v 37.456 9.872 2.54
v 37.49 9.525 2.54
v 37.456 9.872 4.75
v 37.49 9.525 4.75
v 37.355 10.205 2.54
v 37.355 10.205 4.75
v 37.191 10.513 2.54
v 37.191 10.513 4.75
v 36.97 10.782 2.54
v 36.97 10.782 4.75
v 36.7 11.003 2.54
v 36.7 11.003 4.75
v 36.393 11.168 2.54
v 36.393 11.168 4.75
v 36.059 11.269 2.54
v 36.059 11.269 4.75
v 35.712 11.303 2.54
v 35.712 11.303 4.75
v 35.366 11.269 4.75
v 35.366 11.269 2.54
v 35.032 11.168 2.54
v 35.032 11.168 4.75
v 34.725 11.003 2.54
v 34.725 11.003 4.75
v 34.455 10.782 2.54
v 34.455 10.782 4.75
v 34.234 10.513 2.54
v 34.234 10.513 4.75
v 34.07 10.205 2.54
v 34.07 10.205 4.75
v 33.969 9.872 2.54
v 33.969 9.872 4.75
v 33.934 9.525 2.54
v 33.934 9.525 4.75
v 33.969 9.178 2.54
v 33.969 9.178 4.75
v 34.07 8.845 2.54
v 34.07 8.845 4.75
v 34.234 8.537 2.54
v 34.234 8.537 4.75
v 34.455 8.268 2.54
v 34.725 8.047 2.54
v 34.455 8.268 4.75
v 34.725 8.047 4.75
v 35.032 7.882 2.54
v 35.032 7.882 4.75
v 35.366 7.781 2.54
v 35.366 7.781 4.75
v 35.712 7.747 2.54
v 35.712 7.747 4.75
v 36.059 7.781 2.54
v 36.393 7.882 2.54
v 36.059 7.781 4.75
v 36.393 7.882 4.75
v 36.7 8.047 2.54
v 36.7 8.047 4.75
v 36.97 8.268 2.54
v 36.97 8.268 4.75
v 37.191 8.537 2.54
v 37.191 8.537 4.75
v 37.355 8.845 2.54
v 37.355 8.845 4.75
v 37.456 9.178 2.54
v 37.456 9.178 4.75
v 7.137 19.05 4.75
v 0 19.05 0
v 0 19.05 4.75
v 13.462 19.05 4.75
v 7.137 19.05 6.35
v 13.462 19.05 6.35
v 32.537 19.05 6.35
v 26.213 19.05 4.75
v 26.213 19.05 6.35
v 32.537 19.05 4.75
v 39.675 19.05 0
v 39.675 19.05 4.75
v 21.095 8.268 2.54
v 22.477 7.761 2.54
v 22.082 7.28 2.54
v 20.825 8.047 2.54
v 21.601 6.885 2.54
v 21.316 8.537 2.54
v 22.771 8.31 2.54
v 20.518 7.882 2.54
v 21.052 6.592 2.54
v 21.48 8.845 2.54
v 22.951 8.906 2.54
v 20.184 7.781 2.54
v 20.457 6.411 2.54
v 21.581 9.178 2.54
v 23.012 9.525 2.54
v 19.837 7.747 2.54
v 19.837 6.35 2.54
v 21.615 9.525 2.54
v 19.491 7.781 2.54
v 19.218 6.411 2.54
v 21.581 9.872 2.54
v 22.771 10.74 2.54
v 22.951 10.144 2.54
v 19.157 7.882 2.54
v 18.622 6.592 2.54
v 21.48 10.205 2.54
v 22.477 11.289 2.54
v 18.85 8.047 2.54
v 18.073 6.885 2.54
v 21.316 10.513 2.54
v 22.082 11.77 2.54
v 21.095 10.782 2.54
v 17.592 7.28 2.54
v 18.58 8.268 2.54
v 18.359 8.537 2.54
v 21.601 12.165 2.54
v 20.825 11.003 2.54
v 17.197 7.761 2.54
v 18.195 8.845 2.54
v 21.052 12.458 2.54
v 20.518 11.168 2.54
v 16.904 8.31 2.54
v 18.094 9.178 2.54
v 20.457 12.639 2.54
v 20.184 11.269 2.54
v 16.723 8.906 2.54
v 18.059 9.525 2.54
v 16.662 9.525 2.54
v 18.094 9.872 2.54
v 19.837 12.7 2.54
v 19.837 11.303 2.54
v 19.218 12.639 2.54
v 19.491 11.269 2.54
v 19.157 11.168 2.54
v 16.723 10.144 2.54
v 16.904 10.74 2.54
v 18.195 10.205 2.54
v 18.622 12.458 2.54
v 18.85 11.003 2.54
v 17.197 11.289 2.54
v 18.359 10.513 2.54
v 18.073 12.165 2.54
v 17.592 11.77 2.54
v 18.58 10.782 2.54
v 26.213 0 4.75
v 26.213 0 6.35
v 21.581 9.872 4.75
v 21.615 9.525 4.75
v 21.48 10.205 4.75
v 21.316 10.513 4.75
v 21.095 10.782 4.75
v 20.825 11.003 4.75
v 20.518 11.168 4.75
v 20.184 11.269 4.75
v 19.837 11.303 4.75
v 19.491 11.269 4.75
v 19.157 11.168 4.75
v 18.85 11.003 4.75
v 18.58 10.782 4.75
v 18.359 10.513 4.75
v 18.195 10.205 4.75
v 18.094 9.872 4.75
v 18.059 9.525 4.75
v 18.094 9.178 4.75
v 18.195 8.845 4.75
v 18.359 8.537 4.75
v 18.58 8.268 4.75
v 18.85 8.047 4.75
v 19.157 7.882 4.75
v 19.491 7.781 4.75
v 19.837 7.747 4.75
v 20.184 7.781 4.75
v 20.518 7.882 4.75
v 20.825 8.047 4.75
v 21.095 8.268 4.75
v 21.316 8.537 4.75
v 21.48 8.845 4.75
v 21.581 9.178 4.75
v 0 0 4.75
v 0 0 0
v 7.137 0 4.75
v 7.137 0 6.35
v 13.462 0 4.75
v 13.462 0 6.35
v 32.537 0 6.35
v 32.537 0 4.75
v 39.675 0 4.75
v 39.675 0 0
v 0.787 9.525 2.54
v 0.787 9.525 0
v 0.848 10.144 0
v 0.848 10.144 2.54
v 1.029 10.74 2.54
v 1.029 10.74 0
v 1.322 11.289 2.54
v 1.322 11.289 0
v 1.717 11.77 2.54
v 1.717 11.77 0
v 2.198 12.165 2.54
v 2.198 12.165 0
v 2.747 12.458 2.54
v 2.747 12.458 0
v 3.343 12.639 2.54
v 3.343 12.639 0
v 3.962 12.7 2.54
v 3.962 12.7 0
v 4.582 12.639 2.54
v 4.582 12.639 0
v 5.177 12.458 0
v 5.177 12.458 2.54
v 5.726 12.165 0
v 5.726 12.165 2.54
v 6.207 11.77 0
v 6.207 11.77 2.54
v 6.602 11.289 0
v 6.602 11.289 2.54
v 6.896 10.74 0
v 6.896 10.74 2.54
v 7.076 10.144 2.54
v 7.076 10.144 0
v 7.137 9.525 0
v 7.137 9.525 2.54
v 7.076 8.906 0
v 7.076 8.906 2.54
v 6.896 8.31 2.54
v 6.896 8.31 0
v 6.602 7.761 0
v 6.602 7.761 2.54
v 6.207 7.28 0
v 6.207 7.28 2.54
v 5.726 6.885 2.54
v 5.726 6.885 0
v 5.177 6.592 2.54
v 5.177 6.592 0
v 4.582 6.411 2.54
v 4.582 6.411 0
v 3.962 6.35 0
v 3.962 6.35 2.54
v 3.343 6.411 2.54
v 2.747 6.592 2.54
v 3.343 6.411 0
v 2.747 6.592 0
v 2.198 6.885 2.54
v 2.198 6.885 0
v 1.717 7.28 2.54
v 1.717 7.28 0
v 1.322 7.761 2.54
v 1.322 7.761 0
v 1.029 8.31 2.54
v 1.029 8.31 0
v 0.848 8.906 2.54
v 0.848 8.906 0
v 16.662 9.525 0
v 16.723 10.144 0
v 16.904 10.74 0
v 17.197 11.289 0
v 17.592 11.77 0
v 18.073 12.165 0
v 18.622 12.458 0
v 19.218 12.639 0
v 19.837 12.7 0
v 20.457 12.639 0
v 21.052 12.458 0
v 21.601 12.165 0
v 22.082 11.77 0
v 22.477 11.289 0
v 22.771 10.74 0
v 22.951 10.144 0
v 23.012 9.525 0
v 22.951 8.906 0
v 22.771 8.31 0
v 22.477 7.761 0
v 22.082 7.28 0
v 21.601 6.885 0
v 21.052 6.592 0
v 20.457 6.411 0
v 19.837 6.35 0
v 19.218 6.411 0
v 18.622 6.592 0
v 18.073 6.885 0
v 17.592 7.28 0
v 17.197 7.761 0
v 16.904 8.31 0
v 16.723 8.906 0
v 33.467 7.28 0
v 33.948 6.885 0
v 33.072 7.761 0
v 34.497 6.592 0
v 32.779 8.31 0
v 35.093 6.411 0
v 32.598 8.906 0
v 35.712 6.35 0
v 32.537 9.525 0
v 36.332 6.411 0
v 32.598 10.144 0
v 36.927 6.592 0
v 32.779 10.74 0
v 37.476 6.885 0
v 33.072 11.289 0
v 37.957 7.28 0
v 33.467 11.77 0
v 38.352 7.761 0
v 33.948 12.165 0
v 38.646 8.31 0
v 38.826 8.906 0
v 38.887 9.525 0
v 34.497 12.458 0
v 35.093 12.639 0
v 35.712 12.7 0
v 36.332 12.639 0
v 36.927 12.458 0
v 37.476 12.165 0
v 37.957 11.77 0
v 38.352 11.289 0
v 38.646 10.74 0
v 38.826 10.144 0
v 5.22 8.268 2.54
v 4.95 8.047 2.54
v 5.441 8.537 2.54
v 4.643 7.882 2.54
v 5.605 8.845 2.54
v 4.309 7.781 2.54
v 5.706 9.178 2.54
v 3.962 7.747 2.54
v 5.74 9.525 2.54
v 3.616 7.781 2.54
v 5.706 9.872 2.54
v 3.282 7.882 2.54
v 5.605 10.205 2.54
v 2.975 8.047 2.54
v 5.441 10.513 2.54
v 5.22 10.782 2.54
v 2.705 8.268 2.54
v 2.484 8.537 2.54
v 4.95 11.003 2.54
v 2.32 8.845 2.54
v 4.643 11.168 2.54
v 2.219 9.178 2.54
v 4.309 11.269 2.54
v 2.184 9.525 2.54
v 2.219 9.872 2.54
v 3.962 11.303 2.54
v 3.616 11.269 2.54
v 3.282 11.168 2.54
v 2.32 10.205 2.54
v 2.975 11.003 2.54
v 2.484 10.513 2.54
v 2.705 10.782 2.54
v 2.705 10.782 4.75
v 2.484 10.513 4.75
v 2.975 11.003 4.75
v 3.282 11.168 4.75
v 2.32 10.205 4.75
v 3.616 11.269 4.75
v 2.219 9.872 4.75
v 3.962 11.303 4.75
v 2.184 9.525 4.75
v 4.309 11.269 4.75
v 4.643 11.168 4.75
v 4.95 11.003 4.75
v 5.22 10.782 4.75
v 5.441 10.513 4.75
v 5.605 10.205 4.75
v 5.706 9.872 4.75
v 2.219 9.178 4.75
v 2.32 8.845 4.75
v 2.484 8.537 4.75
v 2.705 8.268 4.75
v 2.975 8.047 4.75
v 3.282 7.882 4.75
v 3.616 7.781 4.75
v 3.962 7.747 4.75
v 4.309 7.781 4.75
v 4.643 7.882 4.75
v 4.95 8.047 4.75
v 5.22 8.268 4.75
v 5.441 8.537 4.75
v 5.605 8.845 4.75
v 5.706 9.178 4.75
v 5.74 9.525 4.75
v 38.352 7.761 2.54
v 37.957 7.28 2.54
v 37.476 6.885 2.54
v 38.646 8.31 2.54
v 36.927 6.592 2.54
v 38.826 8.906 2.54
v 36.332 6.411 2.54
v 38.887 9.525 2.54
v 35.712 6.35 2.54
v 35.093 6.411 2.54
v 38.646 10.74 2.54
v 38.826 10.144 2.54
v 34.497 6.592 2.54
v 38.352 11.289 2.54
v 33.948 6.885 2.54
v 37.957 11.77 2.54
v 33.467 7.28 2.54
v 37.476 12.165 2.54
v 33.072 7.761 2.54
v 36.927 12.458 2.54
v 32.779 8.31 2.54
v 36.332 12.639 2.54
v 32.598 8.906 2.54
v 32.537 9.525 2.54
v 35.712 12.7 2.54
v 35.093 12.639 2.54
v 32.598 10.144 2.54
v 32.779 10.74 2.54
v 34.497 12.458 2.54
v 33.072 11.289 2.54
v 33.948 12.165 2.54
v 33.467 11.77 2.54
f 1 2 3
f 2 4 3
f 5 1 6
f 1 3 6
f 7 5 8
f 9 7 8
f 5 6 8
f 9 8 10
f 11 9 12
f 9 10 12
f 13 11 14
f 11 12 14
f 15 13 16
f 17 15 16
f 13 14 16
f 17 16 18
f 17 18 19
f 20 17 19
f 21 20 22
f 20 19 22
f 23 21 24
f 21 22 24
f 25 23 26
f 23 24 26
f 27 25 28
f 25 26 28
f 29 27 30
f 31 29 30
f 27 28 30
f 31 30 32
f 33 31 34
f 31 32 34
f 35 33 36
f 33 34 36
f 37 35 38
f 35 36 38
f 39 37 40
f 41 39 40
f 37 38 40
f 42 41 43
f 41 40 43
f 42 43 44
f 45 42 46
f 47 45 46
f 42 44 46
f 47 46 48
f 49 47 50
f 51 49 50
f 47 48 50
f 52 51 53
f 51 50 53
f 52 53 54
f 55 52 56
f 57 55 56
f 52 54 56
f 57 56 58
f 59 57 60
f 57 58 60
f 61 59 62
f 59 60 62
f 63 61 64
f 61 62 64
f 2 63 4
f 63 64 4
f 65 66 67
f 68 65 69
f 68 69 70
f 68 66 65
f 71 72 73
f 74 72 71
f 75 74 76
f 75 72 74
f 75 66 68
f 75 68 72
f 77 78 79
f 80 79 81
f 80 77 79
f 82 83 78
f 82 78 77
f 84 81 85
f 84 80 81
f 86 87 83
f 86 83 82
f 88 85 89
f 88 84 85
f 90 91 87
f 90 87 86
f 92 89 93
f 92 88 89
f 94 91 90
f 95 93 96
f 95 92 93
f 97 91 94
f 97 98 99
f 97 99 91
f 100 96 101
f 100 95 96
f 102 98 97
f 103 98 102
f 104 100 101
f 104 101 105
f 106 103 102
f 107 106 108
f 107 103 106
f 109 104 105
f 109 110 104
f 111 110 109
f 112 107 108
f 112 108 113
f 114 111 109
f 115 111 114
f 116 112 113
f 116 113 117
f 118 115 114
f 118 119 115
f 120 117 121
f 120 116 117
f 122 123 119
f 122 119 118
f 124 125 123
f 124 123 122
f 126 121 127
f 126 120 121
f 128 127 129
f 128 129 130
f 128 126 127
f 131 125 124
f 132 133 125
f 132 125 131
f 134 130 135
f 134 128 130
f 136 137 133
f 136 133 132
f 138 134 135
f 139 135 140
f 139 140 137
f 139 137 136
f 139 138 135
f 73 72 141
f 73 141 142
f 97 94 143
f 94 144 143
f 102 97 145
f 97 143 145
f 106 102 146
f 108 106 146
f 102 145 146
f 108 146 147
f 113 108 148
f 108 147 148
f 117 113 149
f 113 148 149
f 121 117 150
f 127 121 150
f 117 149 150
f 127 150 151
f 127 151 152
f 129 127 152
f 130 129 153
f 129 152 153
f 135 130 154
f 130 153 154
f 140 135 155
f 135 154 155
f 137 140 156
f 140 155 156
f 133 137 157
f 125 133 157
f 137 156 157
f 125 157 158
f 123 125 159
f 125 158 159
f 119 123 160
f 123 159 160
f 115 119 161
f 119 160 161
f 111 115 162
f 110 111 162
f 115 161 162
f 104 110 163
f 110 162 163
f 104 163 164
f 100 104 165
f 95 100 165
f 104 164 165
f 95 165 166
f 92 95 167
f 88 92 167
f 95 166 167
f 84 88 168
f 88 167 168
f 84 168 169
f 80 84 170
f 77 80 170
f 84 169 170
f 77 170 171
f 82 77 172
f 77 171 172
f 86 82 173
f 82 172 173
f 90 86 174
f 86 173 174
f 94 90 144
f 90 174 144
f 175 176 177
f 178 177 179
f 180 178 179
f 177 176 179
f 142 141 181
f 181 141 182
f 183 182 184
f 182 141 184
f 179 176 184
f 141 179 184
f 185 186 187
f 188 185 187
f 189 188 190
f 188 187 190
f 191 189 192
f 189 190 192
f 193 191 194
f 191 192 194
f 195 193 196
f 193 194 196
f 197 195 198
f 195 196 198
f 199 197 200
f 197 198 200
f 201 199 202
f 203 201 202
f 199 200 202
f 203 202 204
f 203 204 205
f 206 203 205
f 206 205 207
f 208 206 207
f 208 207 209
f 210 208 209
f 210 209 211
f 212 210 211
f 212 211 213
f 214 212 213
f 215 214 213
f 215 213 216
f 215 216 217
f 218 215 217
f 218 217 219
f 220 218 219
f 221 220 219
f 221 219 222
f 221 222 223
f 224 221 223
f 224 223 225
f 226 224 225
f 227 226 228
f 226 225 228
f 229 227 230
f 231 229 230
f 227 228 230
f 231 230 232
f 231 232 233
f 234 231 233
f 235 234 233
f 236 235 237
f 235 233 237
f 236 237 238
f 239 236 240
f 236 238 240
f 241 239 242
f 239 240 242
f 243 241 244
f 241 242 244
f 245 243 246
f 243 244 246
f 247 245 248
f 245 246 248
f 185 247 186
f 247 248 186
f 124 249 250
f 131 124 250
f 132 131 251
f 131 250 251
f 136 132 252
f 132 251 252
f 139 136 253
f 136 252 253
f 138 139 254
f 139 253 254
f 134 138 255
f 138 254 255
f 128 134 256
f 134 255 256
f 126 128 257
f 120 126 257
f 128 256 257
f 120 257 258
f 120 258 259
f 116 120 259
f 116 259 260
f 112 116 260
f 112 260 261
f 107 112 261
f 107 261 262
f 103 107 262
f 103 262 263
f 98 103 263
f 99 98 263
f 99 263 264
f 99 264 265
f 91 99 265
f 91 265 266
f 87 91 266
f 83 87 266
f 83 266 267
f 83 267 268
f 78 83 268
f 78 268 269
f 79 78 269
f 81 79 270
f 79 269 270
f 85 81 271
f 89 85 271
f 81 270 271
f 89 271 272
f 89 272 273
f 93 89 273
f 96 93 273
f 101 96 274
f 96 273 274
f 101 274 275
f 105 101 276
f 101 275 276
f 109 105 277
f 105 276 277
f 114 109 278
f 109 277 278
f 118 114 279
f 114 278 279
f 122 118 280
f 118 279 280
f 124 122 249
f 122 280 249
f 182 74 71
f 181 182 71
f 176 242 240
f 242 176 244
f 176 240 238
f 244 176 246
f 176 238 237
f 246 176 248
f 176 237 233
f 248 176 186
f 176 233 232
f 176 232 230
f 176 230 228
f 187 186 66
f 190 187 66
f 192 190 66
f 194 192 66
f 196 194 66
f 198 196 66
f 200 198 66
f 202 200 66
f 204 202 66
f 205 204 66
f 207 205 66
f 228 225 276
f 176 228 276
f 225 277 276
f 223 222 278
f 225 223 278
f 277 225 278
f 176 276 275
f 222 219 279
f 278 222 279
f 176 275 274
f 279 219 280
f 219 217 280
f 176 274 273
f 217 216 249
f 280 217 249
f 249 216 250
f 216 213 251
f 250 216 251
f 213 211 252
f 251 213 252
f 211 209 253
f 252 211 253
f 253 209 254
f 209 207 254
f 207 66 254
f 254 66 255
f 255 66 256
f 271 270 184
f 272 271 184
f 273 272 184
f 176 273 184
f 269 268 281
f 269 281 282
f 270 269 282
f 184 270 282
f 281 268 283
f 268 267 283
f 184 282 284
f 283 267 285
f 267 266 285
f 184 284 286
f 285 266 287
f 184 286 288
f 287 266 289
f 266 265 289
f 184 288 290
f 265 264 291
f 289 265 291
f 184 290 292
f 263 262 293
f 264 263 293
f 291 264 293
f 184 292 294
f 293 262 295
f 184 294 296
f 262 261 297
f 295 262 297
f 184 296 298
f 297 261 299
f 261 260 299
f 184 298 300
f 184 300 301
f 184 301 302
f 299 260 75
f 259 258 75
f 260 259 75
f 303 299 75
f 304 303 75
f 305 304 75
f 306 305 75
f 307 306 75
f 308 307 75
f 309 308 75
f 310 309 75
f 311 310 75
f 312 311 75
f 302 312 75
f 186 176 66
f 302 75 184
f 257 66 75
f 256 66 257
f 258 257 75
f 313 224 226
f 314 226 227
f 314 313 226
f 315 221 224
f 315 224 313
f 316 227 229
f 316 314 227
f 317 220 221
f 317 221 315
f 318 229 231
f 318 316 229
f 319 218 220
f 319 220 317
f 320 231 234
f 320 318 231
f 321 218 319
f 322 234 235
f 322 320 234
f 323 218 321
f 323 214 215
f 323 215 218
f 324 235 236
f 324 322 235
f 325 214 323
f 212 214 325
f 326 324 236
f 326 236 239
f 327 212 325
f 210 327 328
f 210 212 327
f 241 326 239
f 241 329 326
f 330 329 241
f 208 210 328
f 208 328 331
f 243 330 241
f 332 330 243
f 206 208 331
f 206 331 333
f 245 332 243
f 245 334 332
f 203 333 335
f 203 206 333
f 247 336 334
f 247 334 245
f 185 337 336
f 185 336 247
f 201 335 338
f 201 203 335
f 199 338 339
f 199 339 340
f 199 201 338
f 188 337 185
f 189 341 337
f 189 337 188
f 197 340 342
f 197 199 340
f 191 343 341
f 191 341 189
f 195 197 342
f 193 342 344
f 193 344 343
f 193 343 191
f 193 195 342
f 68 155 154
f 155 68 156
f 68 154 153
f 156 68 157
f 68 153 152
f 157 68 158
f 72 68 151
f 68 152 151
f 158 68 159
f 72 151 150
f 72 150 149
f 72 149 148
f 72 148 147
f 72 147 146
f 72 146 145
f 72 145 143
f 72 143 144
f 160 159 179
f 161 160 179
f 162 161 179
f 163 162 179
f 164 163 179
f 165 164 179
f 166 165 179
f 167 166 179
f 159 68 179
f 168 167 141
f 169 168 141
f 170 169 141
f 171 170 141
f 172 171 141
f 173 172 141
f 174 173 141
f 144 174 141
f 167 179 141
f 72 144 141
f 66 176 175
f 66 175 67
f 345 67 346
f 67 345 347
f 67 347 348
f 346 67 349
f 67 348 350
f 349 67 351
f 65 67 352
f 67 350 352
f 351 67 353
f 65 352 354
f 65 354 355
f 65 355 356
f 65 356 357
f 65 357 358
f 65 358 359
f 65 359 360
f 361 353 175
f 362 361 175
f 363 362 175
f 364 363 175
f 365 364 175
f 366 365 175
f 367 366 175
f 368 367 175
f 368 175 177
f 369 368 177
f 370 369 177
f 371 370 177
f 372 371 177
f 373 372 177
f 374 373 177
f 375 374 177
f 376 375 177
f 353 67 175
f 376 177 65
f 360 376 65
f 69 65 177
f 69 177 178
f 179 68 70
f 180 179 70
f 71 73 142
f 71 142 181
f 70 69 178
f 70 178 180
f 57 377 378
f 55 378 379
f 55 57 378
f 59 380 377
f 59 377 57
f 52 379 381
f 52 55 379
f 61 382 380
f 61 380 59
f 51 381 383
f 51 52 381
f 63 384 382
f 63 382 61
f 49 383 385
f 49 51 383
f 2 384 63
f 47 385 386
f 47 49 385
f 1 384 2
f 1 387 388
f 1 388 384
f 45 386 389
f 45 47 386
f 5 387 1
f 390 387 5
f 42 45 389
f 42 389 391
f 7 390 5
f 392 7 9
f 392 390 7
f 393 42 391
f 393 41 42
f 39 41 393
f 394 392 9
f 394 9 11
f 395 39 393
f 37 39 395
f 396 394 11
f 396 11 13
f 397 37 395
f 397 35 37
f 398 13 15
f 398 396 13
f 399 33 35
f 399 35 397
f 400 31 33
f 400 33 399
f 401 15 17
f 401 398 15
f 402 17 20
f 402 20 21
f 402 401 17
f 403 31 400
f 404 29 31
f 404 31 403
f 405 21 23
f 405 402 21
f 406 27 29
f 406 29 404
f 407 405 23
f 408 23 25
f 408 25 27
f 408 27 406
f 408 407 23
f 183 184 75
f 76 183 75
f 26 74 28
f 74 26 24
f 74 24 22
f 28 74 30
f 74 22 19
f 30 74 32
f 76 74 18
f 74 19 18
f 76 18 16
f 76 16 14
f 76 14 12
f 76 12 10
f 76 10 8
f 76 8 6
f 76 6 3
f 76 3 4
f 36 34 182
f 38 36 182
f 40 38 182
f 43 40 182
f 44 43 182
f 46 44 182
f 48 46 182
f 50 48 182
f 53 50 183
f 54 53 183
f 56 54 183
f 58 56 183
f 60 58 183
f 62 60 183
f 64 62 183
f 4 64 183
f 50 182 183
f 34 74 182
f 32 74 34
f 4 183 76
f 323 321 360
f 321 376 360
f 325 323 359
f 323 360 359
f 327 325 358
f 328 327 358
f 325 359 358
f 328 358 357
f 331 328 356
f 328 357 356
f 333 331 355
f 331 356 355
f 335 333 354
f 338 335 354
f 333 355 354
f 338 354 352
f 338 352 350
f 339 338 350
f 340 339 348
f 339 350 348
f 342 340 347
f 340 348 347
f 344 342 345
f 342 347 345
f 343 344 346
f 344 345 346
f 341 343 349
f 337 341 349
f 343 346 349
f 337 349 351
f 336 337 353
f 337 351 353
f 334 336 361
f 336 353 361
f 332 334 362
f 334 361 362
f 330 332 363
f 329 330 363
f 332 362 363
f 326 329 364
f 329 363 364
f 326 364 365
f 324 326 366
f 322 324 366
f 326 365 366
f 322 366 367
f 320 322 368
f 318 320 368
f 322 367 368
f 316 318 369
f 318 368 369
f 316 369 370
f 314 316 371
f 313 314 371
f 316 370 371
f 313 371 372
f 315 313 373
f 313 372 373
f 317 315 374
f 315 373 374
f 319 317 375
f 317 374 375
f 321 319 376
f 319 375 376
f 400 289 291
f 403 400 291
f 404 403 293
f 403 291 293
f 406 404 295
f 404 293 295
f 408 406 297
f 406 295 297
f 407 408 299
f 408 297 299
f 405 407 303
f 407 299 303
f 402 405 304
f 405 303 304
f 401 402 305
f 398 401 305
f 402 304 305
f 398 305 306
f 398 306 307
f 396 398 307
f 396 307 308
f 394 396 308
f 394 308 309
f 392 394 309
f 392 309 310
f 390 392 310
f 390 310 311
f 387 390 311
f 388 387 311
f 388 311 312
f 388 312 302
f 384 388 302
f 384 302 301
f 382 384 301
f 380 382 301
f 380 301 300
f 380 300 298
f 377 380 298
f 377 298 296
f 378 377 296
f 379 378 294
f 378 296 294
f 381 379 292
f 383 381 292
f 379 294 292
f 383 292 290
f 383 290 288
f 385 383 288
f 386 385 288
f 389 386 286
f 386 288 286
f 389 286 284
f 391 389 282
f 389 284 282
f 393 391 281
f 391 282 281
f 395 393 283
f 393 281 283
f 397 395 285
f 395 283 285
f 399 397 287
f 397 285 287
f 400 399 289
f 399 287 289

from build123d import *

# Parameters (mm, degrees)
SKETCH1_W          = 39.6748
SKETCH1_H          = 19.05
EXTRUDE1_DEPTH     = 6.35
SKETCH2_W          = 7.1374
SKETCH2_H          = 1.6002
SKETCH2_W_2        = 12.7508
CUT_EXTRUDE1_DEPTH = 20.05
HOLE1_D            = 3.556
HOLE1_CBORE_D      = 6.35
HOLE1_CBORE_DEPTH  = 2.54


with BuildPart() as part:
    # Sketch1 → Extrude1 (new body)
    with BuildSketch(Plane.XY):
        with Locations((19.8374, 9.525)):
            Rectangle(SKETCH1_W, SKETCH1_H)
    extrude(amount=EXTRUDE1_DEPTH)

    # Sketch2 → Cut-Extrude1 (cut, through all)
    with BuildSketch(Plane.XZ):
        with Locations((3.5687, 5.5499)):
            Rectangle(SKETCH2_W, SKETCH2_H)
        with Locations((19.8374, 5.5499)):
            Rectangle(SKETCH2_W_2, SKETCH2_H)
        with Locations((36.1061, 5.5499)):
            Rectangle(SKETCH2_W, SKETCH2_H)
    extrude(amount=-CUT_EXTRUDE1_DEPTH, mode=Mode.SUBTRACT)

    # Hole1 (through all)
    with Locations(Plane(origin=(0, 0, 0), x_dir=(-1, 0, 0), z_dir=(0, 0, -1))):
        with Locations((-3.9624, 9.525), (-19.8374, 9.525), (-35.7124, 9.525)):
            CounterBoreHole(HOLE1_D / 2, HOLE1_CBORE_D / 2, HOLE1_CBORE_DEPTH)


solid = part.part
